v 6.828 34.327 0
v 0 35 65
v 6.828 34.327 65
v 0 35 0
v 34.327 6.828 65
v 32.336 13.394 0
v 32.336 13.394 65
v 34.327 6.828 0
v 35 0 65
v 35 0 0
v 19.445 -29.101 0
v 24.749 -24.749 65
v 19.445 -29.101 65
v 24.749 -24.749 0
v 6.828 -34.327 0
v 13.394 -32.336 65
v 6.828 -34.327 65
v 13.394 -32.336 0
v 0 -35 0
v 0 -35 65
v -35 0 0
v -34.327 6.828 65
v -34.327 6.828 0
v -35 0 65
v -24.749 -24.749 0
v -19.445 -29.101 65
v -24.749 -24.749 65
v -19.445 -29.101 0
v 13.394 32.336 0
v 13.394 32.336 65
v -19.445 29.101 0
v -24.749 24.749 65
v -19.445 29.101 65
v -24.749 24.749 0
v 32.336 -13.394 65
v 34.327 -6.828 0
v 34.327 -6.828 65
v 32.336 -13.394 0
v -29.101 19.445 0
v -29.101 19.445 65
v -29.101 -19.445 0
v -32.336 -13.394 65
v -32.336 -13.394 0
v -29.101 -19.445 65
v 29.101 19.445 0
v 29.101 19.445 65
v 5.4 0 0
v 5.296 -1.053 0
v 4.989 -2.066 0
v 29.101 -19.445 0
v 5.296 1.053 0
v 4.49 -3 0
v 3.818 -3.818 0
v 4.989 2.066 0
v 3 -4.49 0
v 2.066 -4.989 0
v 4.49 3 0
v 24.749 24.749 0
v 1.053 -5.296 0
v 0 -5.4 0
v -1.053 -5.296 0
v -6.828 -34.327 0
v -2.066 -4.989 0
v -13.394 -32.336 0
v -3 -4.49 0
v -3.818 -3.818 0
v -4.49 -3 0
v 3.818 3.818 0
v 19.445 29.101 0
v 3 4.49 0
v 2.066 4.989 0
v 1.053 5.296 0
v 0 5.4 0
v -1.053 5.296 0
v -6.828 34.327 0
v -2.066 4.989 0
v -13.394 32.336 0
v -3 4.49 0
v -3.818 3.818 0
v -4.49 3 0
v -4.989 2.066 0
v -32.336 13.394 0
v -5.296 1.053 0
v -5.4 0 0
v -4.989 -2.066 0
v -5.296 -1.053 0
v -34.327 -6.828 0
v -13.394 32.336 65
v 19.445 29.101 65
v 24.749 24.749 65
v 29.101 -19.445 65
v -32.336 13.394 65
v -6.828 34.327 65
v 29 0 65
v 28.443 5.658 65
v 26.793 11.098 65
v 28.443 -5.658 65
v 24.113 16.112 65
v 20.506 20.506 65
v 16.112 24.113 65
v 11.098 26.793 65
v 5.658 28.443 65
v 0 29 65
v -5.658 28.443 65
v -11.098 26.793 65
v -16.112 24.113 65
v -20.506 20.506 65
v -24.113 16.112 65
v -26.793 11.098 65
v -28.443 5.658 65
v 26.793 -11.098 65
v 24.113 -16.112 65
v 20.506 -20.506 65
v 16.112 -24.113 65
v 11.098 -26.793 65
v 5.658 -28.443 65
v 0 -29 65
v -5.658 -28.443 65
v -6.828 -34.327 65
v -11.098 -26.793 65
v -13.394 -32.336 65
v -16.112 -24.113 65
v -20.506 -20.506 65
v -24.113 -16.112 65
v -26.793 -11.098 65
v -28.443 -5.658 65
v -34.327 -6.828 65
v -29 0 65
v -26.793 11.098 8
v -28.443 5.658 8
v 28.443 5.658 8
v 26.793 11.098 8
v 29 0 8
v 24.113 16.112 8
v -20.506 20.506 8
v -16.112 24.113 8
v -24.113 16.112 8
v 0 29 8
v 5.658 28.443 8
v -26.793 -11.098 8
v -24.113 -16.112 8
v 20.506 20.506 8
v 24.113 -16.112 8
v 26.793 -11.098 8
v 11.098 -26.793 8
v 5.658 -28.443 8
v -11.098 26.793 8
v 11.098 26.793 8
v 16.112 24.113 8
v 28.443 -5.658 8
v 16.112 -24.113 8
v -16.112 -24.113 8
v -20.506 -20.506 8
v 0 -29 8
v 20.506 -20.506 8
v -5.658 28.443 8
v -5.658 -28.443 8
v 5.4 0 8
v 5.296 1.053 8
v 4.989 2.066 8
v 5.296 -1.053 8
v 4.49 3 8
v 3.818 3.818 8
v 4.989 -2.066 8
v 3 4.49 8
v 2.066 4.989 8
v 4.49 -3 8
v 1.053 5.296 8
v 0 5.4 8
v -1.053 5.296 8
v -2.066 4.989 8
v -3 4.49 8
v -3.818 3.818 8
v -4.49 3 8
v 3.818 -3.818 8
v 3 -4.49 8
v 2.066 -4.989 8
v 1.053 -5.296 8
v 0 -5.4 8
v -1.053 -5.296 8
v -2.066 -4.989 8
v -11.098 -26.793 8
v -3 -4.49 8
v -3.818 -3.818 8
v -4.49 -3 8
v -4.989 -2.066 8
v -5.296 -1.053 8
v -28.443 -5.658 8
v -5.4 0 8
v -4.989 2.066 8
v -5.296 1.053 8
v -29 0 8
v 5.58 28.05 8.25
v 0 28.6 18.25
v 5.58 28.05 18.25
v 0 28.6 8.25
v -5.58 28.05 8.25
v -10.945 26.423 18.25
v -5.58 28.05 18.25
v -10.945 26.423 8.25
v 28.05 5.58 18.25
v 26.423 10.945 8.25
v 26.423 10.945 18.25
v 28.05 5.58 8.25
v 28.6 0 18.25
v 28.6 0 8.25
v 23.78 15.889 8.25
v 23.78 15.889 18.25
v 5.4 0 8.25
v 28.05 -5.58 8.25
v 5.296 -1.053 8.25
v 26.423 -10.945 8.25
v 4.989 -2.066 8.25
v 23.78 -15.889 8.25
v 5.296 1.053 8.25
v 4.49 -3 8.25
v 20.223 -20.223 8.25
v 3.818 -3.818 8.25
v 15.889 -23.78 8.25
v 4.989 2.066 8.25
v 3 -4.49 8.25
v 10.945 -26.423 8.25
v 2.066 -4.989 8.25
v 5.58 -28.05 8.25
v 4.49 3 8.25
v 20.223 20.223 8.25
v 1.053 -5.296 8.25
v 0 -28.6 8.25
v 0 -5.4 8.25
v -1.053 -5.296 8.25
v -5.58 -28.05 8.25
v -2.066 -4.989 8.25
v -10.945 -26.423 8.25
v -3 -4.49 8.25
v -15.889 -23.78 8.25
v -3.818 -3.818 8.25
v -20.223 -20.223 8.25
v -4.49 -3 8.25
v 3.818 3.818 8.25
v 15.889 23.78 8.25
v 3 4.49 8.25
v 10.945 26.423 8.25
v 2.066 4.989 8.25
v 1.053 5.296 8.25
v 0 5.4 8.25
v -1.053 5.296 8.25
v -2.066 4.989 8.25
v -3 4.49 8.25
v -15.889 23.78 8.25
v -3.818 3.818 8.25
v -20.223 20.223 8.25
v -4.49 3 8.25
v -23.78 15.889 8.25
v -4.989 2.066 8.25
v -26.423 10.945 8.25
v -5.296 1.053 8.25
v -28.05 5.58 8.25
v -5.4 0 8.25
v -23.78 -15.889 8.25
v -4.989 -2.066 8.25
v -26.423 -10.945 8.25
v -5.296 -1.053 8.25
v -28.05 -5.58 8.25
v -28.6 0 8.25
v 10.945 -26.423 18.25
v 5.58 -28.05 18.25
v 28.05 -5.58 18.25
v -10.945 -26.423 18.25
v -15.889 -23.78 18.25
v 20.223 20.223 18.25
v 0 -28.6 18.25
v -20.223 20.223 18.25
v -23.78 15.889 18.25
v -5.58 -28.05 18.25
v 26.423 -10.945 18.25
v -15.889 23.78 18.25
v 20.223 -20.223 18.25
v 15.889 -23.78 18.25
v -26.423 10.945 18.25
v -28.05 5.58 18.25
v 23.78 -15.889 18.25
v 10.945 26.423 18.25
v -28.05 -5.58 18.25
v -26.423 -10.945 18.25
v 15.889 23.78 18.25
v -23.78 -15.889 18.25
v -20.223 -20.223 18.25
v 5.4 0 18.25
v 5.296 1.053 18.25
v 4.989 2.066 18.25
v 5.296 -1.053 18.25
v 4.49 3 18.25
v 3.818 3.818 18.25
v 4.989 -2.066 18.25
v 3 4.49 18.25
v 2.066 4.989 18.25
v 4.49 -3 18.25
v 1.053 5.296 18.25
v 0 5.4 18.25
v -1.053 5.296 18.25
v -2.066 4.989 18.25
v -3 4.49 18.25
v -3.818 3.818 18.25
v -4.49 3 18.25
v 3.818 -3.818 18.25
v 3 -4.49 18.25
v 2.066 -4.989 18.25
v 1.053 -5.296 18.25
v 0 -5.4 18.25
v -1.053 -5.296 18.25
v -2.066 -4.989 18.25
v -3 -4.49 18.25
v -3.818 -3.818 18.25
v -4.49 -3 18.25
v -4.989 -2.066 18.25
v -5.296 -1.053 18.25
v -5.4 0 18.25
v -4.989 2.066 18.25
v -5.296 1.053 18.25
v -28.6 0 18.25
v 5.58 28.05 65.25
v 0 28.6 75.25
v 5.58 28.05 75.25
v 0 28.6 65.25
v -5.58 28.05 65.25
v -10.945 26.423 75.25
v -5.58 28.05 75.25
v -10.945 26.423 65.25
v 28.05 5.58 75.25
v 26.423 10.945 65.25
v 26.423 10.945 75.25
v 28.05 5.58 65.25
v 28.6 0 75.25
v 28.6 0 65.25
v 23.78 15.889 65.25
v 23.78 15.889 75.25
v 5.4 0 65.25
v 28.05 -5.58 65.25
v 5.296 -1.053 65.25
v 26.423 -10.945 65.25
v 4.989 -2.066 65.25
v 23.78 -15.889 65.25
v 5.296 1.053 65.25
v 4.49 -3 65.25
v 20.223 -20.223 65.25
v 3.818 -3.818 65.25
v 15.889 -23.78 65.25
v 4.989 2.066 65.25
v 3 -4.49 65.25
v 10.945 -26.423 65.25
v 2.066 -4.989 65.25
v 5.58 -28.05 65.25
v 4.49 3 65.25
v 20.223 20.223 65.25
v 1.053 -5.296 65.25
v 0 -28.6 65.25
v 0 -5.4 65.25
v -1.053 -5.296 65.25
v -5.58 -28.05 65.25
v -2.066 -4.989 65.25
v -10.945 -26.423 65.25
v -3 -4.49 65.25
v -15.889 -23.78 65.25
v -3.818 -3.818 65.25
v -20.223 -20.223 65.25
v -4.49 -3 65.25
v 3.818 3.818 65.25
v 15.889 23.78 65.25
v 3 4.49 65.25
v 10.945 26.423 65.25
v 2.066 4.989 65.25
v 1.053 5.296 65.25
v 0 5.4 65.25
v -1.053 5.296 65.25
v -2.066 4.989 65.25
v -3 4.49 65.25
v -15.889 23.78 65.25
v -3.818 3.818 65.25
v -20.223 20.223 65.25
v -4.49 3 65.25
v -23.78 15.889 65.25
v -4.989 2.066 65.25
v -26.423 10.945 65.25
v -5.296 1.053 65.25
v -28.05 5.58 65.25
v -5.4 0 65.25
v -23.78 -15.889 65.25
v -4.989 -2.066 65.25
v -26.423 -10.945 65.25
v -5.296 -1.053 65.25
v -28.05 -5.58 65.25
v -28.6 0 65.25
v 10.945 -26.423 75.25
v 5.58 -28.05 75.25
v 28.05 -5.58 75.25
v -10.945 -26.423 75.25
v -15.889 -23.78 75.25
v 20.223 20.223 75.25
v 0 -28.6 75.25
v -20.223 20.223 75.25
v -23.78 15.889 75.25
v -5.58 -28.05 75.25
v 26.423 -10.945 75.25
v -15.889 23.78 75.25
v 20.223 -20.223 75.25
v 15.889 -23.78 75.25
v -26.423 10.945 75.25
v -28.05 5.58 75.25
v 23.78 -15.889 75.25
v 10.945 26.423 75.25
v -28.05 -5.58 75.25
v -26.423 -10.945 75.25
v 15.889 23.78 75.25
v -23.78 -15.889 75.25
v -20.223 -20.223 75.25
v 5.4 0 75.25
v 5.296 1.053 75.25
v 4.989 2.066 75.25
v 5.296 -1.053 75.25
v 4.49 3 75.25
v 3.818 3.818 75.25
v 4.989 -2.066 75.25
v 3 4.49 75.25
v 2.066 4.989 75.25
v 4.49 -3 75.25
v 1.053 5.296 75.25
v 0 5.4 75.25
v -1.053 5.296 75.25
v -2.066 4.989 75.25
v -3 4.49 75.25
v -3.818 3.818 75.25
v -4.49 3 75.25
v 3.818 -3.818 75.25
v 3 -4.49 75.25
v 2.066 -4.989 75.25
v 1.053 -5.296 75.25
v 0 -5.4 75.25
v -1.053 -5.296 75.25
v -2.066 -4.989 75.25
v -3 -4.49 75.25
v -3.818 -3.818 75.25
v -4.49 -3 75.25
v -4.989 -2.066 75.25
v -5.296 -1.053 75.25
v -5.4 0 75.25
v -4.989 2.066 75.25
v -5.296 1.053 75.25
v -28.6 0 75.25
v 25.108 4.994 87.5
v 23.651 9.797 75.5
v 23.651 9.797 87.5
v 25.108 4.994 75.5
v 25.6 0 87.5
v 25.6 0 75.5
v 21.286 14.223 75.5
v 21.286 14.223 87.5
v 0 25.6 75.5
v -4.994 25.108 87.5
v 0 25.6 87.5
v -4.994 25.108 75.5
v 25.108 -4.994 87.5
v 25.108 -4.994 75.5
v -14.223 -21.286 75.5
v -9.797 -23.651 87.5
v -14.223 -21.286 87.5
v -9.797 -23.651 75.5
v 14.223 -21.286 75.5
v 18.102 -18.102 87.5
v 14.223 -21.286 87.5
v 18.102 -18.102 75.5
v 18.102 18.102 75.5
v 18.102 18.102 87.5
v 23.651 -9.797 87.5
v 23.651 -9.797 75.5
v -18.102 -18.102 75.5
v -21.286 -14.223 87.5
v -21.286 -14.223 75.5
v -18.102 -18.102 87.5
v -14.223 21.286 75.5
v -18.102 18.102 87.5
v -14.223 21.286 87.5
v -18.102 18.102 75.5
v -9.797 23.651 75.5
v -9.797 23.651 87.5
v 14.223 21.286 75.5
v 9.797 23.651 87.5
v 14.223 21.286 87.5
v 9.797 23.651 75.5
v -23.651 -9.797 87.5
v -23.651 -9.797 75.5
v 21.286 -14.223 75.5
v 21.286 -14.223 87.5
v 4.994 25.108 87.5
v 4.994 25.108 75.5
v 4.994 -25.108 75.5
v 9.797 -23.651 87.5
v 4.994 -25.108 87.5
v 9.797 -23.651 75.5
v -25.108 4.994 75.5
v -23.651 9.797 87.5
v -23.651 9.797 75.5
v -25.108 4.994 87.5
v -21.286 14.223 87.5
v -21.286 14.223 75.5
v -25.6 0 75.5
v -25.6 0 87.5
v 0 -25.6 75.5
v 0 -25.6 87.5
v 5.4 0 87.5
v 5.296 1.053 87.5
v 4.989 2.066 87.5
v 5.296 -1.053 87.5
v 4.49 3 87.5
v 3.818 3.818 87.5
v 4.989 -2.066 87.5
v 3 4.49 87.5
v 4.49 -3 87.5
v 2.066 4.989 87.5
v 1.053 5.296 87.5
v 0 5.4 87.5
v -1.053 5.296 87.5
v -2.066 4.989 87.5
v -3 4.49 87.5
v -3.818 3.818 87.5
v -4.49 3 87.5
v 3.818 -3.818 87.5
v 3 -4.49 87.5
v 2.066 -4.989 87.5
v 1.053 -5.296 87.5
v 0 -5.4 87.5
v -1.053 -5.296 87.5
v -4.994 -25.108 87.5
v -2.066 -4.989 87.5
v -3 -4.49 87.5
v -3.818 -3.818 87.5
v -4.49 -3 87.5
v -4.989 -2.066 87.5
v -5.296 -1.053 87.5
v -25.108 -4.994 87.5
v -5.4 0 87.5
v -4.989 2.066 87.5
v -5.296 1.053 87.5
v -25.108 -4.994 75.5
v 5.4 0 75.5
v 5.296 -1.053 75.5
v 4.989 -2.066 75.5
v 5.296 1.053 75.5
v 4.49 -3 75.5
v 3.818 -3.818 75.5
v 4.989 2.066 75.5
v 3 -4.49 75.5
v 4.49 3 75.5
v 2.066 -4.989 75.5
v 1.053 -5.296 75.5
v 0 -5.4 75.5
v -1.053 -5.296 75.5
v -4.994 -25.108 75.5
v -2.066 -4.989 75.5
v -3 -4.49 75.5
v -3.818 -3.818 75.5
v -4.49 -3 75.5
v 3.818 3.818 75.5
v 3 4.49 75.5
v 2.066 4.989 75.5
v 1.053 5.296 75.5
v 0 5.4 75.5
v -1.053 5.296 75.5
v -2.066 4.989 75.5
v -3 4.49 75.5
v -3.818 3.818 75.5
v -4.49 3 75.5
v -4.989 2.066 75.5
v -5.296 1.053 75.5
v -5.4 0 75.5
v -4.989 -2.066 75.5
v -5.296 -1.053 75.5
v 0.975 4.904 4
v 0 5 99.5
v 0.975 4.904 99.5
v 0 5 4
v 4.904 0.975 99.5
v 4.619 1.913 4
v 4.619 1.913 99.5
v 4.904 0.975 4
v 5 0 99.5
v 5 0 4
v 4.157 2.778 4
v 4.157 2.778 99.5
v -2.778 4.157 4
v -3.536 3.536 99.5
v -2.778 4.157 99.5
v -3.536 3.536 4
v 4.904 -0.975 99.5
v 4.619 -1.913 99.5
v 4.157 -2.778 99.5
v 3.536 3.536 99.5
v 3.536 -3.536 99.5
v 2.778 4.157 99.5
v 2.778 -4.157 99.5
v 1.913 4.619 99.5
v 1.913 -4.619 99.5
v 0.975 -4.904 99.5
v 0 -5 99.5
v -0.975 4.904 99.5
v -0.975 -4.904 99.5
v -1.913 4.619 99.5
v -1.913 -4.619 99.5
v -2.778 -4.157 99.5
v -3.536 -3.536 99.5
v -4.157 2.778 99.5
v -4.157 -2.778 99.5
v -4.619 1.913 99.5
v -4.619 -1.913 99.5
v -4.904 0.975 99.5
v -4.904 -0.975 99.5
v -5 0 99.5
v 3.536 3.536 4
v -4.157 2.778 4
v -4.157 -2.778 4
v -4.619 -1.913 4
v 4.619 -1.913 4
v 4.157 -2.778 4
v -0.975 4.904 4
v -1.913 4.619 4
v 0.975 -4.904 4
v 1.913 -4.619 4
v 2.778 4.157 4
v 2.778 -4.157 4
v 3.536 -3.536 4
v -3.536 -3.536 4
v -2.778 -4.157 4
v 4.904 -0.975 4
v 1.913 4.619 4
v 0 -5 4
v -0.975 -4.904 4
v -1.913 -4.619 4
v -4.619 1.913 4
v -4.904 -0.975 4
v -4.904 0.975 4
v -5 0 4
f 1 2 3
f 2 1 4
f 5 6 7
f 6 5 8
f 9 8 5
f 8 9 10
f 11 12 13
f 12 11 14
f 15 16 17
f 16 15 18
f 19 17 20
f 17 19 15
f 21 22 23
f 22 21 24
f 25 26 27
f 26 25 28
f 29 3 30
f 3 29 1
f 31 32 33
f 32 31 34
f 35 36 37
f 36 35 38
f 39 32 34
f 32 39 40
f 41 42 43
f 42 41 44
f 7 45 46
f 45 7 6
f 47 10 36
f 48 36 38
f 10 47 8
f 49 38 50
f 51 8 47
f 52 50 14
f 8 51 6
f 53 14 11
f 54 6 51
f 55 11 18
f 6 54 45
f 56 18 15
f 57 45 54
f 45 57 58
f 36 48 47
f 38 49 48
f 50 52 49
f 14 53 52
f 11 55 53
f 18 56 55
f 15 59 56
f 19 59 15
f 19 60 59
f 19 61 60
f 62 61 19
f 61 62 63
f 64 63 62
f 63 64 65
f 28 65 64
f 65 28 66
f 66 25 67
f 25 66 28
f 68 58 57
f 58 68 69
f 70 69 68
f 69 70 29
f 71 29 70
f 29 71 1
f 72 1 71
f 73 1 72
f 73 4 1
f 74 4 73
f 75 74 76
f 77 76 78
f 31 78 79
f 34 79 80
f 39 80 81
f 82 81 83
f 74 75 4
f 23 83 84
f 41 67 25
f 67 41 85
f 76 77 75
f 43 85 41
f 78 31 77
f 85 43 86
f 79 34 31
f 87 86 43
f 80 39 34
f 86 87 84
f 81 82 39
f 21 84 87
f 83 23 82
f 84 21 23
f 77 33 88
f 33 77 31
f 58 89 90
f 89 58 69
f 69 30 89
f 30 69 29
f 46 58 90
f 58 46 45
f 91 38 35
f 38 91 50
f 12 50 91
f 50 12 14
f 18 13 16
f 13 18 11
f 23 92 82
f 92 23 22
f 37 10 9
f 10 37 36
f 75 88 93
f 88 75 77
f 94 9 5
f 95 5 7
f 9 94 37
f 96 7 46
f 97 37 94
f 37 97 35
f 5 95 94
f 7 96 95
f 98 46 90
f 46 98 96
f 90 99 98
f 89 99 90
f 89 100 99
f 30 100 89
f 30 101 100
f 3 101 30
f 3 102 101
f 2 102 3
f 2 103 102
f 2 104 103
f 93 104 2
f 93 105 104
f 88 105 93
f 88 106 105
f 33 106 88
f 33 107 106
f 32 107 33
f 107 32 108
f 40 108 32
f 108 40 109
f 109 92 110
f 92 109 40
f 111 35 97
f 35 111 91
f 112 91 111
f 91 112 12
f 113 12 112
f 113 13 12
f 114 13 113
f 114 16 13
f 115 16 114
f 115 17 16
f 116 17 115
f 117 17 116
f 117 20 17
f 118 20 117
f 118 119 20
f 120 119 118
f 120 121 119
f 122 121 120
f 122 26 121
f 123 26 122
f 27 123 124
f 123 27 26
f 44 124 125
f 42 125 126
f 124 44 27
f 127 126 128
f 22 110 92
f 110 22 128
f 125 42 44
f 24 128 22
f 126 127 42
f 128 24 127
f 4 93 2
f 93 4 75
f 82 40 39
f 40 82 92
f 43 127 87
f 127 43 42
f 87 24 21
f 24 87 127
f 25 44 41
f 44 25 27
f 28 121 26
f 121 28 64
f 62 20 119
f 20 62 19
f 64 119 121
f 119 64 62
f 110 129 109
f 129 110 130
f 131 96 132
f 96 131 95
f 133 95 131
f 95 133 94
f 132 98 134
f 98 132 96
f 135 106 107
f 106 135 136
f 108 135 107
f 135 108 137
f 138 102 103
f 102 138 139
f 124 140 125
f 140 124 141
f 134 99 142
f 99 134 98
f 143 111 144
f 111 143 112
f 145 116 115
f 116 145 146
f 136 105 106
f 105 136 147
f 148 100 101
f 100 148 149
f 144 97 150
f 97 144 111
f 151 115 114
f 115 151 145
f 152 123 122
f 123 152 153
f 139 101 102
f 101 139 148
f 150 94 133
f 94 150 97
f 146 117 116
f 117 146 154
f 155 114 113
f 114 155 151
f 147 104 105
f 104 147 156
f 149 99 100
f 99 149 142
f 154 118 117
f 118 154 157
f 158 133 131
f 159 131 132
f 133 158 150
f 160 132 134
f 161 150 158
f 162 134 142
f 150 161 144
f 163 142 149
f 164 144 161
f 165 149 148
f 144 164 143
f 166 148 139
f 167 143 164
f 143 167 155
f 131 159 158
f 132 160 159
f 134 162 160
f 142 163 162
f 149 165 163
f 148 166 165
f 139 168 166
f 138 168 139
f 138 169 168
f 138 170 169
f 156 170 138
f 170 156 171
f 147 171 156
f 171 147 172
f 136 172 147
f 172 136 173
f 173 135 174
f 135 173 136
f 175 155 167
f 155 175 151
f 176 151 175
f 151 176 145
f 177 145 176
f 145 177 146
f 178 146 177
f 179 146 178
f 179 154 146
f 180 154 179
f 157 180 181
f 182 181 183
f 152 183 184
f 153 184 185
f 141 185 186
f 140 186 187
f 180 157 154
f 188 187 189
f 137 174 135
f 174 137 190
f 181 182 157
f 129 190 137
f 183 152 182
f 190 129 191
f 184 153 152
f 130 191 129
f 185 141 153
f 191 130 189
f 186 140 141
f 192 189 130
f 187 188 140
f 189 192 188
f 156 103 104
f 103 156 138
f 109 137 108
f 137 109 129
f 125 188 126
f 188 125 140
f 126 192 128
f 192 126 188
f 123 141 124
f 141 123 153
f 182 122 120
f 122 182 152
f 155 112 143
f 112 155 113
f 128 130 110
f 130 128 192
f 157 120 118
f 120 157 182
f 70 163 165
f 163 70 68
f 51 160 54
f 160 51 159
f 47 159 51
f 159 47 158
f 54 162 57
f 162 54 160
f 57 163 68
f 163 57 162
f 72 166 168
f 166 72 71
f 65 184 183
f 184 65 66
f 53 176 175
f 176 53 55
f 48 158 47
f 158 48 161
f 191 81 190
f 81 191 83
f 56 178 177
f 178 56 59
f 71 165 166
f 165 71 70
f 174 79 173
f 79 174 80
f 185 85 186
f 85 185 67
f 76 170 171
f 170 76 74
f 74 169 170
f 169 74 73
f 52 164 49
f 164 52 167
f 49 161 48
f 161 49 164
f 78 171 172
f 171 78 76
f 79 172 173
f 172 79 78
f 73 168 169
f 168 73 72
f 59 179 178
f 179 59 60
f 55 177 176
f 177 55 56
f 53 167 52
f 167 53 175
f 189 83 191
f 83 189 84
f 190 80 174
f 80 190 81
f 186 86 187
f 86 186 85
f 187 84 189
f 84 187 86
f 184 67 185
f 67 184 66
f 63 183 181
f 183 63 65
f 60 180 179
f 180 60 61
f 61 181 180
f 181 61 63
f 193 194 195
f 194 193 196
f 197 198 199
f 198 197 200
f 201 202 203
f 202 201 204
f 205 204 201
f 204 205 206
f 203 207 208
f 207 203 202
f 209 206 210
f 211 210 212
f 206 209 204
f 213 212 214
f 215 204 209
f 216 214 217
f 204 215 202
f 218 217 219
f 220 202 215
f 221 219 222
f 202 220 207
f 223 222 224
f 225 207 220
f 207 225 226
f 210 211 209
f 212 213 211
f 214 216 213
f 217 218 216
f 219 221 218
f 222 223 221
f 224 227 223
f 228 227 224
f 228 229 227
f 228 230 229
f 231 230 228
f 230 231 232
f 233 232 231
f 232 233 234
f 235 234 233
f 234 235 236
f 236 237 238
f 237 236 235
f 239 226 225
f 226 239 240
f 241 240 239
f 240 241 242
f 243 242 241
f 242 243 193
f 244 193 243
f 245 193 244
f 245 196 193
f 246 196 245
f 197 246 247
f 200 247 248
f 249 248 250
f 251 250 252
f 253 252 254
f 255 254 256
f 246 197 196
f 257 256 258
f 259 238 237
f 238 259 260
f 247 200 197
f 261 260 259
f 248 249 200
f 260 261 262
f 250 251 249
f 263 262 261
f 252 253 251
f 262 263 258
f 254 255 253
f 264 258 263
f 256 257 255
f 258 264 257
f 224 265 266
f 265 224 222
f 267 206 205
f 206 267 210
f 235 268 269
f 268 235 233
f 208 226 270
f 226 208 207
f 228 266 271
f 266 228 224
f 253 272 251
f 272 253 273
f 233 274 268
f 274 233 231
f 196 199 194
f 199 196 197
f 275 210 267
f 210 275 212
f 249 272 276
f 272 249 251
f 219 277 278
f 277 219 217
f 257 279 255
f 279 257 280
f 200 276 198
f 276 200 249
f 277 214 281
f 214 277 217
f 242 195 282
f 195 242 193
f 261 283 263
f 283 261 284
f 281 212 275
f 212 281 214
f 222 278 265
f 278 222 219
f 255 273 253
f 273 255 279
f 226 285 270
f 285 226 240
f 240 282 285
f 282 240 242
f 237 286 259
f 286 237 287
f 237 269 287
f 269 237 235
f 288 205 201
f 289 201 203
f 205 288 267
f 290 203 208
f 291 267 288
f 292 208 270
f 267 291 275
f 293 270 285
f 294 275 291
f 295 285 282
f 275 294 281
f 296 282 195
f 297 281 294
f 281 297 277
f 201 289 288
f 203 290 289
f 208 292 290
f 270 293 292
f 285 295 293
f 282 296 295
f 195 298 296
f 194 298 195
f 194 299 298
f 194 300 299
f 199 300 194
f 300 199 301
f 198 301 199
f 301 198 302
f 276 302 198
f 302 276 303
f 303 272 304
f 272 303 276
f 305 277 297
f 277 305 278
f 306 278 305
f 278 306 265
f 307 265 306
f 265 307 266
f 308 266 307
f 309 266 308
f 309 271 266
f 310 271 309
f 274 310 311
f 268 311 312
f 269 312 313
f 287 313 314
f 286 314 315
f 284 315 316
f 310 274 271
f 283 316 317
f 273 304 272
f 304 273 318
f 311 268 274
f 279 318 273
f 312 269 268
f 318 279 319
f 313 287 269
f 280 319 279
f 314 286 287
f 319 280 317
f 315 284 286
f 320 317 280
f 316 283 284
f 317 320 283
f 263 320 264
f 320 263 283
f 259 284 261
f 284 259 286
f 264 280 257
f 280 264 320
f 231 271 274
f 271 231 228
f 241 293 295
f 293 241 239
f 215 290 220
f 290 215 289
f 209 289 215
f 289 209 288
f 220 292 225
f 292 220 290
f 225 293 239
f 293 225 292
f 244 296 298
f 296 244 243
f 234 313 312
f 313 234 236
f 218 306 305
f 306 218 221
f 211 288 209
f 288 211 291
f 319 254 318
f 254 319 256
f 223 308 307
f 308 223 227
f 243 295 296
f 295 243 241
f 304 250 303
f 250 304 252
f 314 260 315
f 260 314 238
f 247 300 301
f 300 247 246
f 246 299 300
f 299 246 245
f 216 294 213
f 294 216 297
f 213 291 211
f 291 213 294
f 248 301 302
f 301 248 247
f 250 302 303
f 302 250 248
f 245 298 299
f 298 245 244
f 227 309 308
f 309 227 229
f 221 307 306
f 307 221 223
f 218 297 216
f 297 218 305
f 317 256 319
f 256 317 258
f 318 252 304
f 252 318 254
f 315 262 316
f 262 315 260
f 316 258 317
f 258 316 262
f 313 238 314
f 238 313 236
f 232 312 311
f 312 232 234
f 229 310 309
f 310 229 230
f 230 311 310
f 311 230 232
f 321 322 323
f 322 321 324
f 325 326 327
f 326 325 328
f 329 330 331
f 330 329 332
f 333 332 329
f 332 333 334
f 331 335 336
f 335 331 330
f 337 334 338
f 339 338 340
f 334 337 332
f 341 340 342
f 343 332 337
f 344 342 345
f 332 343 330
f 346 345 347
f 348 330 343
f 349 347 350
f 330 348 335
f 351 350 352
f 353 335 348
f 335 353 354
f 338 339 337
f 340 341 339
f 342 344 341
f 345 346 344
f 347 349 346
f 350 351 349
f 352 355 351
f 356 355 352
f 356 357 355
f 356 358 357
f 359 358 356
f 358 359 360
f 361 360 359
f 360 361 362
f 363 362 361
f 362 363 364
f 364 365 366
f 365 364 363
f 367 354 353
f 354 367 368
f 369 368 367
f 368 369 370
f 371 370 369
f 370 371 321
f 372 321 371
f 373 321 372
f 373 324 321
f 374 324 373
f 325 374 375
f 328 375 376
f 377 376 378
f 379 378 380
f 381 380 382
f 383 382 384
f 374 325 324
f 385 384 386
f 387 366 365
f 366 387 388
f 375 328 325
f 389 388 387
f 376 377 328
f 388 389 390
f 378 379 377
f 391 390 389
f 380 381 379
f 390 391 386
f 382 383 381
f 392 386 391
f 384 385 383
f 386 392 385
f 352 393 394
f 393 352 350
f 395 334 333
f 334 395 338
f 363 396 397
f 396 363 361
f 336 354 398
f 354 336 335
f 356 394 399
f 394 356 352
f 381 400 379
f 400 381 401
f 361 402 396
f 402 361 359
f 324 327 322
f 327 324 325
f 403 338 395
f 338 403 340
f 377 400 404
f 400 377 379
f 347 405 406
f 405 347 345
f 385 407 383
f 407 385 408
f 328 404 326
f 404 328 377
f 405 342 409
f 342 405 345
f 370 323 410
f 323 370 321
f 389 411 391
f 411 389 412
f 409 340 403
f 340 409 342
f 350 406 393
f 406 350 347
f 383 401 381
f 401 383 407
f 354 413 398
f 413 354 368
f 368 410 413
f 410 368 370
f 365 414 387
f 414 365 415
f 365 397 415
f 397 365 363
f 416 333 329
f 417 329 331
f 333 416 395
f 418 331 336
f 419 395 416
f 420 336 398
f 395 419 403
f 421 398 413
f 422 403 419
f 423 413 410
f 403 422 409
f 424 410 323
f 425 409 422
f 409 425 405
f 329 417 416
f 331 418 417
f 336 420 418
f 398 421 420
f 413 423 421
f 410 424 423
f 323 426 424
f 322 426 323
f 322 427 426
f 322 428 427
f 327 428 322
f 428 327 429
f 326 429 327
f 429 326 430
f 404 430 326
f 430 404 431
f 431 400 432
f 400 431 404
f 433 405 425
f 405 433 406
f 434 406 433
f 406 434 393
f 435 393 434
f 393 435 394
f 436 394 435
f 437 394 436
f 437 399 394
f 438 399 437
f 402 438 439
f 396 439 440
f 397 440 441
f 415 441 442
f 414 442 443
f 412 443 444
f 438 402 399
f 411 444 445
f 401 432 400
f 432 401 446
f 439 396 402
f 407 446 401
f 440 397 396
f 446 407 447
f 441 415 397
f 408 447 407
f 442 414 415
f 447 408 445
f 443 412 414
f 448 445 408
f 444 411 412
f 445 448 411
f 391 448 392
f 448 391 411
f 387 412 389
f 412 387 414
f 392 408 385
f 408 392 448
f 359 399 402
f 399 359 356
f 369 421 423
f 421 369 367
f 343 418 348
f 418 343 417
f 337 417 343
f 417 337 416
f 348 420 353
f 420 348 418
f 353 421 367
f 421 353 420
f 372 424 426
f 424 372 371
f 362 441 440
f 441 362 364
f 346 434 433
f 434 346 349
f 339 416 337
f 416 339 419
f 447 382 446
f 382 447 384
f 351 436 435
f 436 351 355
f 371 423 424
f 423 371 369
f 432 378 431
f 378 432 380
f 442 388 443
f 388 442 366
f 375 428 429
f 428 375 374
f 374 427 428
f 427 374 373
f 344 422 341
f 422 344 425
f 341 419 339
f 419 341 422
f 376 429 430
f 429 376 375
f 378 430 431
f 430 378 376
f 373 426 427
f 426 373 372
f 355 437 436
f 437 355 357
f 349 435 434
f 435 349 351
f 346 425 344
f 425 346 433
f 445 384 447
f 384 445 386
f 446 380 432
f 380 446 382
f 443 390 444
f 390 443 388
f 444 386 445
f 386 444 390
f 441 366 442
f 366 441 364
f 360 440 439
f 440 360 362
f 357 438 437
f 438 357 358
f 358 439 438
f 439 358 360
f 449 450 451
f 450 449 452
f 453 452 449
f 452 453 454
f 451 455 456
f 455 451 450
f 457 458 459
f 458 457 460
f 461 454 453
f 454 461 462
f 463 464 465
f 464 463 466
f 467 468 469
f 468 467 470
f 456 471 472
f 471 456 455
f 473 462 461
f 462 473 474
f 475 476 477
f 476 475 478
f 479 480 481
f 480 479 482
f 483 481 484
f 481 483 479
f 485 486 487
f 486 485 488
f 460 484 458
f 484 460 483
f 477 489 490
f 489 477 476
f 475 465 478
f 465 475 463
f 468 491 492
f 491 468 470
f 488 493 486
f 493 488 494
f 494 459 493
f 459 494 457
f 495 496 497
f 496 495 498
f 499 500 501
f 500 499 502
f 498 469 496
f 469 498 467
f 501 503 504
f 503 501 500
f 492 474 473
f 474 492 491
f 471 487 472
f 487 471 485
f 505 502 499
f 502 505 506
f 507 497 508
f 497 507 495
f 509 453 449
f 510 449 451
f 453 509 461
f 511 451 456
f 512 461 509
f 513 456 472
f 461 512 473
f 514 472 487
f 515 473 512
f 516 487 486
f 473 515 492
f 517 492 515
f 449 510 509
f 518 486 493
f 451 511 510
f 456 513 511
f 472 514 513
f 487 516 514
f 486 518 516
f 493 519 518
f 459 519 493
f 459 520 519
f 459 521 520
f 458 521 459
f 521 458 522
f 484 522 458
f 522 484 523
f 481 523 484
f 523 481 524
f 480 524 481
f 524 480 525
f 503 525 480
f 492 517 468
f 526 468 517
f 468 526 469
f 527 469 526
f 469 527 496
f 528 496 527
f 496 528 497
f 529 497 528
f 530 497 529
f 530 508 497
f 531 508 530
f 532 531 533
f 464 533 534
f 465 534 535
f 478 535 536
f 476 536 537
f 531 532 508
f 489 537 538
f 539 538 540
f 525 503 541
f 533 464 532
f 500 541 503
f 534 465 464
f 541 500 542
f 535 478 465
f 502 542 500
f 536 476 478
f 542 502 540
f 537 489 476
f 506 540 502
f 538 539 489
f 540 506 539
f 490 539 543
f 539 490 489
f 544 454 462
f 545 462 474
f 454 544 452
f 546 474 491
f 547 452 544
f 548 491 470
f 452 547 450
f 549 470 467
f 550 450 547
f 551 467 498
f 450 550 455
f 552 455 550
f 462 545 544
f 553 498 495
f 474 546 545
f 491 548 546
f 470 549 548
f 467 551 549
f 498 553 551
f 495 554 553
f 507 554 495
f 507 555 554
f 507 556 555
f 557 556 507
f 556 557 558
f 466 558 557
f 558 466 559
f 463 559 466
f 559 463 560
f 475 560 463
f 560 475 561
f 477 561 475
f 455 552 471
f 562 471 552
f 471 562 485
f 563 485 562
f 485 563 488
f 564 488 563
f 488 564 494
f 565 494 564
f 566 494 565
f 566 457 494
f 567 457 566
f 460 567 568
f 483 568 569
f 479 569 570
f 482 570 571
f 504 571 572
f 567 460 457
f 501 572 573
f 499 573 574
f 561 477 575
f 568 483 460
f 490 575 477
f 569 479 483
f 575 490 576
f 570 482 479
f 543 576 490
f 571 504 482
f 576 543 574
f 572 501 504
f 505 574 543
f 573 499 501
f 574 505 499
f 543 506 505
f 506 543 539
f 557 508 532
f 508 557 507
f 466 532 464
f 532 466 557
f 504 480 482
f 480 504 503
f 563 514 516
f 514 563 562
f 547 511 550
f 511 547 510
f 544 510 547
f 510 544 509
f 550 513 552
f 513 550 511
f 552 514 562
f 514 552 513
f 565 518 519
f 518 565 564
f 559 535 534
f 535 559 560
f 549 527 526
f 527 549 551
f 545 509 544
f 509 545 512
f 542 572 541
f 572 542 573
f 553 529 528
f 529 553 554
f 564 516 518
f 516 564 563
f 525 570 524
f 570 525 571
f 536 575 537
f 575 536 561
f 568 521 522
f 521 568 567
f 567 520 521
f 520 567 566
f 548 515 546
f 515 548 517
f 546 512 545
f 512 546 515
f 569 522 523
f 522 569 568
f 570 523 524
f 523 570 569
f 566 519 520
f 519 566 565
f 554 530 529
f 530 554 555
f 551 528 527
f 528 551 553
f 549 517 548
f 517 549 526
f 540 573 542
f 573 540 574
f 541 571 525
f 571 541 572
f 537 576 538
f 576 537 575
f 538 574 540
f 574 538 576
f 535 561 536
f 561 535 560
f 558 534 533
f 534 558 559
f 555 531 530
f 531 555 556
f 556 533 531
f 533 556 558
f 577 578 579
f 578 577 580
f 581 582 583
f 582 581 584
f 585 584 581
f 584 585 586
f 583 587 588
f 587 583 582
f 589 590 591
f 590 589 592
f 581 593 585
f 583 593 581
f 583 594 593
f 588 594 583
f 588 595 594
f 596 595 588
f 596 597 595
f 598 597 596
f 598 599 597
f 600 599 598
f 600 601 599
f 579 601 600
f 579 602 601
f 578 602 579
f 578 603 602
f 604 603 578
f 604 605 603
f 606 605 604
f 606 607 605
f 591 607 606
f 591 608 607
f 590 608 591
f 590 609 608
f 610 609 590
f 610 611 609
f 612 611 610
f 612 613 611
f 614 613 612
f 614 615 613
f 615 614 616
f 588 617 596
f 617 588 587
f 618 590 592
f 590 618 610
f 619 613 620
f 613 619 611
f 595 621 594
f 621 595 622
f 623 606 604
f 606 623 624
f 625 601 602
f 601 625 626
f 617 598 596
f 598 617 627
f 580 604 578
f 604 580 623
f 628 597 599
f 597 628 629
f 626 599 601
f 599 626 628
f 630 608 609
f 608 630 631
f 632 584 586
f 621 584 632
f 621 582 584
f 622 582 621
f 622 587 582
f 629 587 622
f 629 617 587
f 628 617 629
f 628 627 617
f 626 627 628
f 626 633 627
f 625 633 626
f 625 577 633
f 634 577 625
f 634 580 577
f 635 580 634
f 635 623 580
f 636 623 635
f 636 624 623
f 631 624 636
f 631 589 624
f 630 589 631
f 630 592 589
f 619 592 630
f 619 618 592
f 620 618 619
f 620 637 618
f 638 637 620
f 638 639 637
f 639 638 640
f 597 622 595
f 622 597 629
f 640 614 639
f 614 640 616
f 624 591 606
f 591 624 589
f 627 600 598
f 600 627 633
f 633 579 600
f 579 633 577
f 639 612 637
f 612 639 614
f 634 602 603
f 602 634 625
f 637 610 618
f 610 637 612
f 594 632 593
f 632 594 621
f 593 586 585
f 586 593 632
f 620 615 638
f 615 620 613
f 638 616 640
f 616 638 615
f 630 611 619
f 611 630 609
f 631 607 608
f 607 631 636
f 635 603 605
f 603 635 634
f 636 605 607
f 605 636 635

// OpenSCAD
$fn = 32;

// ------------------------------------------------------------------------
// Bearing housing: housing d70, two bearings and a shaft
// Every part is its own module, assembly() places them once.
// ------------------------------------------------------------------------

// --- part 1 ---
module housing() {
  difference() {
    cylinder(h = 65, d = 70);
    translate([0, 0, 8]) cylinder(h = 58, d = 58);
    translate([0, 0, -1]) cylinder(h = 10, d = 10.8);
  }
}

// --- part 2 ---
module bearing_lower() {
  difference() {
      translate([0, 0, 0]) cylinder(h = 10, d = 57.2);
      translate([0, 0, -1]) cylinder(h = 12, d = 10.8);
    }
}

// --- part 3 ---
module bearing_upper() {
  difference() {
      translate([0, 0, 0]) cylinder(h = 10, d = 57.2);
      translate([0, 0, -1]) cylinder(h = 12, d = 10.8);
    }
}

// --- part 4 ---
module spacer() {
  difference() {
      translate([0, 0, 0]) cylinder(h = 12, d = 51.2);
      translate([0, 0, -1]) cylinder(h = 14, d = 10.8);
    }
}

// --- part 5 ---
module shaft() {
  translate([0, 0, -47.75]) cylinder(h = 95.5, d = 10);
}

// --- assembly ---
module assembly() {
  translate([0, 0, 0]) rotate([0, 0, 0]) housing();
  translate([0, 0, 8.25]) rotate([0, 0, 0]) bearing_lower();
  translate([0, 0, 65.25]) rotate([0, 0, 0]) bearing_upper();
  translate([0, 0, 75.5]) rotate([0, 0, 0]) spacer();
  translate([0, 0, 51.75]) rotate([0, 0, 0]) shaft();
}

assembly();
